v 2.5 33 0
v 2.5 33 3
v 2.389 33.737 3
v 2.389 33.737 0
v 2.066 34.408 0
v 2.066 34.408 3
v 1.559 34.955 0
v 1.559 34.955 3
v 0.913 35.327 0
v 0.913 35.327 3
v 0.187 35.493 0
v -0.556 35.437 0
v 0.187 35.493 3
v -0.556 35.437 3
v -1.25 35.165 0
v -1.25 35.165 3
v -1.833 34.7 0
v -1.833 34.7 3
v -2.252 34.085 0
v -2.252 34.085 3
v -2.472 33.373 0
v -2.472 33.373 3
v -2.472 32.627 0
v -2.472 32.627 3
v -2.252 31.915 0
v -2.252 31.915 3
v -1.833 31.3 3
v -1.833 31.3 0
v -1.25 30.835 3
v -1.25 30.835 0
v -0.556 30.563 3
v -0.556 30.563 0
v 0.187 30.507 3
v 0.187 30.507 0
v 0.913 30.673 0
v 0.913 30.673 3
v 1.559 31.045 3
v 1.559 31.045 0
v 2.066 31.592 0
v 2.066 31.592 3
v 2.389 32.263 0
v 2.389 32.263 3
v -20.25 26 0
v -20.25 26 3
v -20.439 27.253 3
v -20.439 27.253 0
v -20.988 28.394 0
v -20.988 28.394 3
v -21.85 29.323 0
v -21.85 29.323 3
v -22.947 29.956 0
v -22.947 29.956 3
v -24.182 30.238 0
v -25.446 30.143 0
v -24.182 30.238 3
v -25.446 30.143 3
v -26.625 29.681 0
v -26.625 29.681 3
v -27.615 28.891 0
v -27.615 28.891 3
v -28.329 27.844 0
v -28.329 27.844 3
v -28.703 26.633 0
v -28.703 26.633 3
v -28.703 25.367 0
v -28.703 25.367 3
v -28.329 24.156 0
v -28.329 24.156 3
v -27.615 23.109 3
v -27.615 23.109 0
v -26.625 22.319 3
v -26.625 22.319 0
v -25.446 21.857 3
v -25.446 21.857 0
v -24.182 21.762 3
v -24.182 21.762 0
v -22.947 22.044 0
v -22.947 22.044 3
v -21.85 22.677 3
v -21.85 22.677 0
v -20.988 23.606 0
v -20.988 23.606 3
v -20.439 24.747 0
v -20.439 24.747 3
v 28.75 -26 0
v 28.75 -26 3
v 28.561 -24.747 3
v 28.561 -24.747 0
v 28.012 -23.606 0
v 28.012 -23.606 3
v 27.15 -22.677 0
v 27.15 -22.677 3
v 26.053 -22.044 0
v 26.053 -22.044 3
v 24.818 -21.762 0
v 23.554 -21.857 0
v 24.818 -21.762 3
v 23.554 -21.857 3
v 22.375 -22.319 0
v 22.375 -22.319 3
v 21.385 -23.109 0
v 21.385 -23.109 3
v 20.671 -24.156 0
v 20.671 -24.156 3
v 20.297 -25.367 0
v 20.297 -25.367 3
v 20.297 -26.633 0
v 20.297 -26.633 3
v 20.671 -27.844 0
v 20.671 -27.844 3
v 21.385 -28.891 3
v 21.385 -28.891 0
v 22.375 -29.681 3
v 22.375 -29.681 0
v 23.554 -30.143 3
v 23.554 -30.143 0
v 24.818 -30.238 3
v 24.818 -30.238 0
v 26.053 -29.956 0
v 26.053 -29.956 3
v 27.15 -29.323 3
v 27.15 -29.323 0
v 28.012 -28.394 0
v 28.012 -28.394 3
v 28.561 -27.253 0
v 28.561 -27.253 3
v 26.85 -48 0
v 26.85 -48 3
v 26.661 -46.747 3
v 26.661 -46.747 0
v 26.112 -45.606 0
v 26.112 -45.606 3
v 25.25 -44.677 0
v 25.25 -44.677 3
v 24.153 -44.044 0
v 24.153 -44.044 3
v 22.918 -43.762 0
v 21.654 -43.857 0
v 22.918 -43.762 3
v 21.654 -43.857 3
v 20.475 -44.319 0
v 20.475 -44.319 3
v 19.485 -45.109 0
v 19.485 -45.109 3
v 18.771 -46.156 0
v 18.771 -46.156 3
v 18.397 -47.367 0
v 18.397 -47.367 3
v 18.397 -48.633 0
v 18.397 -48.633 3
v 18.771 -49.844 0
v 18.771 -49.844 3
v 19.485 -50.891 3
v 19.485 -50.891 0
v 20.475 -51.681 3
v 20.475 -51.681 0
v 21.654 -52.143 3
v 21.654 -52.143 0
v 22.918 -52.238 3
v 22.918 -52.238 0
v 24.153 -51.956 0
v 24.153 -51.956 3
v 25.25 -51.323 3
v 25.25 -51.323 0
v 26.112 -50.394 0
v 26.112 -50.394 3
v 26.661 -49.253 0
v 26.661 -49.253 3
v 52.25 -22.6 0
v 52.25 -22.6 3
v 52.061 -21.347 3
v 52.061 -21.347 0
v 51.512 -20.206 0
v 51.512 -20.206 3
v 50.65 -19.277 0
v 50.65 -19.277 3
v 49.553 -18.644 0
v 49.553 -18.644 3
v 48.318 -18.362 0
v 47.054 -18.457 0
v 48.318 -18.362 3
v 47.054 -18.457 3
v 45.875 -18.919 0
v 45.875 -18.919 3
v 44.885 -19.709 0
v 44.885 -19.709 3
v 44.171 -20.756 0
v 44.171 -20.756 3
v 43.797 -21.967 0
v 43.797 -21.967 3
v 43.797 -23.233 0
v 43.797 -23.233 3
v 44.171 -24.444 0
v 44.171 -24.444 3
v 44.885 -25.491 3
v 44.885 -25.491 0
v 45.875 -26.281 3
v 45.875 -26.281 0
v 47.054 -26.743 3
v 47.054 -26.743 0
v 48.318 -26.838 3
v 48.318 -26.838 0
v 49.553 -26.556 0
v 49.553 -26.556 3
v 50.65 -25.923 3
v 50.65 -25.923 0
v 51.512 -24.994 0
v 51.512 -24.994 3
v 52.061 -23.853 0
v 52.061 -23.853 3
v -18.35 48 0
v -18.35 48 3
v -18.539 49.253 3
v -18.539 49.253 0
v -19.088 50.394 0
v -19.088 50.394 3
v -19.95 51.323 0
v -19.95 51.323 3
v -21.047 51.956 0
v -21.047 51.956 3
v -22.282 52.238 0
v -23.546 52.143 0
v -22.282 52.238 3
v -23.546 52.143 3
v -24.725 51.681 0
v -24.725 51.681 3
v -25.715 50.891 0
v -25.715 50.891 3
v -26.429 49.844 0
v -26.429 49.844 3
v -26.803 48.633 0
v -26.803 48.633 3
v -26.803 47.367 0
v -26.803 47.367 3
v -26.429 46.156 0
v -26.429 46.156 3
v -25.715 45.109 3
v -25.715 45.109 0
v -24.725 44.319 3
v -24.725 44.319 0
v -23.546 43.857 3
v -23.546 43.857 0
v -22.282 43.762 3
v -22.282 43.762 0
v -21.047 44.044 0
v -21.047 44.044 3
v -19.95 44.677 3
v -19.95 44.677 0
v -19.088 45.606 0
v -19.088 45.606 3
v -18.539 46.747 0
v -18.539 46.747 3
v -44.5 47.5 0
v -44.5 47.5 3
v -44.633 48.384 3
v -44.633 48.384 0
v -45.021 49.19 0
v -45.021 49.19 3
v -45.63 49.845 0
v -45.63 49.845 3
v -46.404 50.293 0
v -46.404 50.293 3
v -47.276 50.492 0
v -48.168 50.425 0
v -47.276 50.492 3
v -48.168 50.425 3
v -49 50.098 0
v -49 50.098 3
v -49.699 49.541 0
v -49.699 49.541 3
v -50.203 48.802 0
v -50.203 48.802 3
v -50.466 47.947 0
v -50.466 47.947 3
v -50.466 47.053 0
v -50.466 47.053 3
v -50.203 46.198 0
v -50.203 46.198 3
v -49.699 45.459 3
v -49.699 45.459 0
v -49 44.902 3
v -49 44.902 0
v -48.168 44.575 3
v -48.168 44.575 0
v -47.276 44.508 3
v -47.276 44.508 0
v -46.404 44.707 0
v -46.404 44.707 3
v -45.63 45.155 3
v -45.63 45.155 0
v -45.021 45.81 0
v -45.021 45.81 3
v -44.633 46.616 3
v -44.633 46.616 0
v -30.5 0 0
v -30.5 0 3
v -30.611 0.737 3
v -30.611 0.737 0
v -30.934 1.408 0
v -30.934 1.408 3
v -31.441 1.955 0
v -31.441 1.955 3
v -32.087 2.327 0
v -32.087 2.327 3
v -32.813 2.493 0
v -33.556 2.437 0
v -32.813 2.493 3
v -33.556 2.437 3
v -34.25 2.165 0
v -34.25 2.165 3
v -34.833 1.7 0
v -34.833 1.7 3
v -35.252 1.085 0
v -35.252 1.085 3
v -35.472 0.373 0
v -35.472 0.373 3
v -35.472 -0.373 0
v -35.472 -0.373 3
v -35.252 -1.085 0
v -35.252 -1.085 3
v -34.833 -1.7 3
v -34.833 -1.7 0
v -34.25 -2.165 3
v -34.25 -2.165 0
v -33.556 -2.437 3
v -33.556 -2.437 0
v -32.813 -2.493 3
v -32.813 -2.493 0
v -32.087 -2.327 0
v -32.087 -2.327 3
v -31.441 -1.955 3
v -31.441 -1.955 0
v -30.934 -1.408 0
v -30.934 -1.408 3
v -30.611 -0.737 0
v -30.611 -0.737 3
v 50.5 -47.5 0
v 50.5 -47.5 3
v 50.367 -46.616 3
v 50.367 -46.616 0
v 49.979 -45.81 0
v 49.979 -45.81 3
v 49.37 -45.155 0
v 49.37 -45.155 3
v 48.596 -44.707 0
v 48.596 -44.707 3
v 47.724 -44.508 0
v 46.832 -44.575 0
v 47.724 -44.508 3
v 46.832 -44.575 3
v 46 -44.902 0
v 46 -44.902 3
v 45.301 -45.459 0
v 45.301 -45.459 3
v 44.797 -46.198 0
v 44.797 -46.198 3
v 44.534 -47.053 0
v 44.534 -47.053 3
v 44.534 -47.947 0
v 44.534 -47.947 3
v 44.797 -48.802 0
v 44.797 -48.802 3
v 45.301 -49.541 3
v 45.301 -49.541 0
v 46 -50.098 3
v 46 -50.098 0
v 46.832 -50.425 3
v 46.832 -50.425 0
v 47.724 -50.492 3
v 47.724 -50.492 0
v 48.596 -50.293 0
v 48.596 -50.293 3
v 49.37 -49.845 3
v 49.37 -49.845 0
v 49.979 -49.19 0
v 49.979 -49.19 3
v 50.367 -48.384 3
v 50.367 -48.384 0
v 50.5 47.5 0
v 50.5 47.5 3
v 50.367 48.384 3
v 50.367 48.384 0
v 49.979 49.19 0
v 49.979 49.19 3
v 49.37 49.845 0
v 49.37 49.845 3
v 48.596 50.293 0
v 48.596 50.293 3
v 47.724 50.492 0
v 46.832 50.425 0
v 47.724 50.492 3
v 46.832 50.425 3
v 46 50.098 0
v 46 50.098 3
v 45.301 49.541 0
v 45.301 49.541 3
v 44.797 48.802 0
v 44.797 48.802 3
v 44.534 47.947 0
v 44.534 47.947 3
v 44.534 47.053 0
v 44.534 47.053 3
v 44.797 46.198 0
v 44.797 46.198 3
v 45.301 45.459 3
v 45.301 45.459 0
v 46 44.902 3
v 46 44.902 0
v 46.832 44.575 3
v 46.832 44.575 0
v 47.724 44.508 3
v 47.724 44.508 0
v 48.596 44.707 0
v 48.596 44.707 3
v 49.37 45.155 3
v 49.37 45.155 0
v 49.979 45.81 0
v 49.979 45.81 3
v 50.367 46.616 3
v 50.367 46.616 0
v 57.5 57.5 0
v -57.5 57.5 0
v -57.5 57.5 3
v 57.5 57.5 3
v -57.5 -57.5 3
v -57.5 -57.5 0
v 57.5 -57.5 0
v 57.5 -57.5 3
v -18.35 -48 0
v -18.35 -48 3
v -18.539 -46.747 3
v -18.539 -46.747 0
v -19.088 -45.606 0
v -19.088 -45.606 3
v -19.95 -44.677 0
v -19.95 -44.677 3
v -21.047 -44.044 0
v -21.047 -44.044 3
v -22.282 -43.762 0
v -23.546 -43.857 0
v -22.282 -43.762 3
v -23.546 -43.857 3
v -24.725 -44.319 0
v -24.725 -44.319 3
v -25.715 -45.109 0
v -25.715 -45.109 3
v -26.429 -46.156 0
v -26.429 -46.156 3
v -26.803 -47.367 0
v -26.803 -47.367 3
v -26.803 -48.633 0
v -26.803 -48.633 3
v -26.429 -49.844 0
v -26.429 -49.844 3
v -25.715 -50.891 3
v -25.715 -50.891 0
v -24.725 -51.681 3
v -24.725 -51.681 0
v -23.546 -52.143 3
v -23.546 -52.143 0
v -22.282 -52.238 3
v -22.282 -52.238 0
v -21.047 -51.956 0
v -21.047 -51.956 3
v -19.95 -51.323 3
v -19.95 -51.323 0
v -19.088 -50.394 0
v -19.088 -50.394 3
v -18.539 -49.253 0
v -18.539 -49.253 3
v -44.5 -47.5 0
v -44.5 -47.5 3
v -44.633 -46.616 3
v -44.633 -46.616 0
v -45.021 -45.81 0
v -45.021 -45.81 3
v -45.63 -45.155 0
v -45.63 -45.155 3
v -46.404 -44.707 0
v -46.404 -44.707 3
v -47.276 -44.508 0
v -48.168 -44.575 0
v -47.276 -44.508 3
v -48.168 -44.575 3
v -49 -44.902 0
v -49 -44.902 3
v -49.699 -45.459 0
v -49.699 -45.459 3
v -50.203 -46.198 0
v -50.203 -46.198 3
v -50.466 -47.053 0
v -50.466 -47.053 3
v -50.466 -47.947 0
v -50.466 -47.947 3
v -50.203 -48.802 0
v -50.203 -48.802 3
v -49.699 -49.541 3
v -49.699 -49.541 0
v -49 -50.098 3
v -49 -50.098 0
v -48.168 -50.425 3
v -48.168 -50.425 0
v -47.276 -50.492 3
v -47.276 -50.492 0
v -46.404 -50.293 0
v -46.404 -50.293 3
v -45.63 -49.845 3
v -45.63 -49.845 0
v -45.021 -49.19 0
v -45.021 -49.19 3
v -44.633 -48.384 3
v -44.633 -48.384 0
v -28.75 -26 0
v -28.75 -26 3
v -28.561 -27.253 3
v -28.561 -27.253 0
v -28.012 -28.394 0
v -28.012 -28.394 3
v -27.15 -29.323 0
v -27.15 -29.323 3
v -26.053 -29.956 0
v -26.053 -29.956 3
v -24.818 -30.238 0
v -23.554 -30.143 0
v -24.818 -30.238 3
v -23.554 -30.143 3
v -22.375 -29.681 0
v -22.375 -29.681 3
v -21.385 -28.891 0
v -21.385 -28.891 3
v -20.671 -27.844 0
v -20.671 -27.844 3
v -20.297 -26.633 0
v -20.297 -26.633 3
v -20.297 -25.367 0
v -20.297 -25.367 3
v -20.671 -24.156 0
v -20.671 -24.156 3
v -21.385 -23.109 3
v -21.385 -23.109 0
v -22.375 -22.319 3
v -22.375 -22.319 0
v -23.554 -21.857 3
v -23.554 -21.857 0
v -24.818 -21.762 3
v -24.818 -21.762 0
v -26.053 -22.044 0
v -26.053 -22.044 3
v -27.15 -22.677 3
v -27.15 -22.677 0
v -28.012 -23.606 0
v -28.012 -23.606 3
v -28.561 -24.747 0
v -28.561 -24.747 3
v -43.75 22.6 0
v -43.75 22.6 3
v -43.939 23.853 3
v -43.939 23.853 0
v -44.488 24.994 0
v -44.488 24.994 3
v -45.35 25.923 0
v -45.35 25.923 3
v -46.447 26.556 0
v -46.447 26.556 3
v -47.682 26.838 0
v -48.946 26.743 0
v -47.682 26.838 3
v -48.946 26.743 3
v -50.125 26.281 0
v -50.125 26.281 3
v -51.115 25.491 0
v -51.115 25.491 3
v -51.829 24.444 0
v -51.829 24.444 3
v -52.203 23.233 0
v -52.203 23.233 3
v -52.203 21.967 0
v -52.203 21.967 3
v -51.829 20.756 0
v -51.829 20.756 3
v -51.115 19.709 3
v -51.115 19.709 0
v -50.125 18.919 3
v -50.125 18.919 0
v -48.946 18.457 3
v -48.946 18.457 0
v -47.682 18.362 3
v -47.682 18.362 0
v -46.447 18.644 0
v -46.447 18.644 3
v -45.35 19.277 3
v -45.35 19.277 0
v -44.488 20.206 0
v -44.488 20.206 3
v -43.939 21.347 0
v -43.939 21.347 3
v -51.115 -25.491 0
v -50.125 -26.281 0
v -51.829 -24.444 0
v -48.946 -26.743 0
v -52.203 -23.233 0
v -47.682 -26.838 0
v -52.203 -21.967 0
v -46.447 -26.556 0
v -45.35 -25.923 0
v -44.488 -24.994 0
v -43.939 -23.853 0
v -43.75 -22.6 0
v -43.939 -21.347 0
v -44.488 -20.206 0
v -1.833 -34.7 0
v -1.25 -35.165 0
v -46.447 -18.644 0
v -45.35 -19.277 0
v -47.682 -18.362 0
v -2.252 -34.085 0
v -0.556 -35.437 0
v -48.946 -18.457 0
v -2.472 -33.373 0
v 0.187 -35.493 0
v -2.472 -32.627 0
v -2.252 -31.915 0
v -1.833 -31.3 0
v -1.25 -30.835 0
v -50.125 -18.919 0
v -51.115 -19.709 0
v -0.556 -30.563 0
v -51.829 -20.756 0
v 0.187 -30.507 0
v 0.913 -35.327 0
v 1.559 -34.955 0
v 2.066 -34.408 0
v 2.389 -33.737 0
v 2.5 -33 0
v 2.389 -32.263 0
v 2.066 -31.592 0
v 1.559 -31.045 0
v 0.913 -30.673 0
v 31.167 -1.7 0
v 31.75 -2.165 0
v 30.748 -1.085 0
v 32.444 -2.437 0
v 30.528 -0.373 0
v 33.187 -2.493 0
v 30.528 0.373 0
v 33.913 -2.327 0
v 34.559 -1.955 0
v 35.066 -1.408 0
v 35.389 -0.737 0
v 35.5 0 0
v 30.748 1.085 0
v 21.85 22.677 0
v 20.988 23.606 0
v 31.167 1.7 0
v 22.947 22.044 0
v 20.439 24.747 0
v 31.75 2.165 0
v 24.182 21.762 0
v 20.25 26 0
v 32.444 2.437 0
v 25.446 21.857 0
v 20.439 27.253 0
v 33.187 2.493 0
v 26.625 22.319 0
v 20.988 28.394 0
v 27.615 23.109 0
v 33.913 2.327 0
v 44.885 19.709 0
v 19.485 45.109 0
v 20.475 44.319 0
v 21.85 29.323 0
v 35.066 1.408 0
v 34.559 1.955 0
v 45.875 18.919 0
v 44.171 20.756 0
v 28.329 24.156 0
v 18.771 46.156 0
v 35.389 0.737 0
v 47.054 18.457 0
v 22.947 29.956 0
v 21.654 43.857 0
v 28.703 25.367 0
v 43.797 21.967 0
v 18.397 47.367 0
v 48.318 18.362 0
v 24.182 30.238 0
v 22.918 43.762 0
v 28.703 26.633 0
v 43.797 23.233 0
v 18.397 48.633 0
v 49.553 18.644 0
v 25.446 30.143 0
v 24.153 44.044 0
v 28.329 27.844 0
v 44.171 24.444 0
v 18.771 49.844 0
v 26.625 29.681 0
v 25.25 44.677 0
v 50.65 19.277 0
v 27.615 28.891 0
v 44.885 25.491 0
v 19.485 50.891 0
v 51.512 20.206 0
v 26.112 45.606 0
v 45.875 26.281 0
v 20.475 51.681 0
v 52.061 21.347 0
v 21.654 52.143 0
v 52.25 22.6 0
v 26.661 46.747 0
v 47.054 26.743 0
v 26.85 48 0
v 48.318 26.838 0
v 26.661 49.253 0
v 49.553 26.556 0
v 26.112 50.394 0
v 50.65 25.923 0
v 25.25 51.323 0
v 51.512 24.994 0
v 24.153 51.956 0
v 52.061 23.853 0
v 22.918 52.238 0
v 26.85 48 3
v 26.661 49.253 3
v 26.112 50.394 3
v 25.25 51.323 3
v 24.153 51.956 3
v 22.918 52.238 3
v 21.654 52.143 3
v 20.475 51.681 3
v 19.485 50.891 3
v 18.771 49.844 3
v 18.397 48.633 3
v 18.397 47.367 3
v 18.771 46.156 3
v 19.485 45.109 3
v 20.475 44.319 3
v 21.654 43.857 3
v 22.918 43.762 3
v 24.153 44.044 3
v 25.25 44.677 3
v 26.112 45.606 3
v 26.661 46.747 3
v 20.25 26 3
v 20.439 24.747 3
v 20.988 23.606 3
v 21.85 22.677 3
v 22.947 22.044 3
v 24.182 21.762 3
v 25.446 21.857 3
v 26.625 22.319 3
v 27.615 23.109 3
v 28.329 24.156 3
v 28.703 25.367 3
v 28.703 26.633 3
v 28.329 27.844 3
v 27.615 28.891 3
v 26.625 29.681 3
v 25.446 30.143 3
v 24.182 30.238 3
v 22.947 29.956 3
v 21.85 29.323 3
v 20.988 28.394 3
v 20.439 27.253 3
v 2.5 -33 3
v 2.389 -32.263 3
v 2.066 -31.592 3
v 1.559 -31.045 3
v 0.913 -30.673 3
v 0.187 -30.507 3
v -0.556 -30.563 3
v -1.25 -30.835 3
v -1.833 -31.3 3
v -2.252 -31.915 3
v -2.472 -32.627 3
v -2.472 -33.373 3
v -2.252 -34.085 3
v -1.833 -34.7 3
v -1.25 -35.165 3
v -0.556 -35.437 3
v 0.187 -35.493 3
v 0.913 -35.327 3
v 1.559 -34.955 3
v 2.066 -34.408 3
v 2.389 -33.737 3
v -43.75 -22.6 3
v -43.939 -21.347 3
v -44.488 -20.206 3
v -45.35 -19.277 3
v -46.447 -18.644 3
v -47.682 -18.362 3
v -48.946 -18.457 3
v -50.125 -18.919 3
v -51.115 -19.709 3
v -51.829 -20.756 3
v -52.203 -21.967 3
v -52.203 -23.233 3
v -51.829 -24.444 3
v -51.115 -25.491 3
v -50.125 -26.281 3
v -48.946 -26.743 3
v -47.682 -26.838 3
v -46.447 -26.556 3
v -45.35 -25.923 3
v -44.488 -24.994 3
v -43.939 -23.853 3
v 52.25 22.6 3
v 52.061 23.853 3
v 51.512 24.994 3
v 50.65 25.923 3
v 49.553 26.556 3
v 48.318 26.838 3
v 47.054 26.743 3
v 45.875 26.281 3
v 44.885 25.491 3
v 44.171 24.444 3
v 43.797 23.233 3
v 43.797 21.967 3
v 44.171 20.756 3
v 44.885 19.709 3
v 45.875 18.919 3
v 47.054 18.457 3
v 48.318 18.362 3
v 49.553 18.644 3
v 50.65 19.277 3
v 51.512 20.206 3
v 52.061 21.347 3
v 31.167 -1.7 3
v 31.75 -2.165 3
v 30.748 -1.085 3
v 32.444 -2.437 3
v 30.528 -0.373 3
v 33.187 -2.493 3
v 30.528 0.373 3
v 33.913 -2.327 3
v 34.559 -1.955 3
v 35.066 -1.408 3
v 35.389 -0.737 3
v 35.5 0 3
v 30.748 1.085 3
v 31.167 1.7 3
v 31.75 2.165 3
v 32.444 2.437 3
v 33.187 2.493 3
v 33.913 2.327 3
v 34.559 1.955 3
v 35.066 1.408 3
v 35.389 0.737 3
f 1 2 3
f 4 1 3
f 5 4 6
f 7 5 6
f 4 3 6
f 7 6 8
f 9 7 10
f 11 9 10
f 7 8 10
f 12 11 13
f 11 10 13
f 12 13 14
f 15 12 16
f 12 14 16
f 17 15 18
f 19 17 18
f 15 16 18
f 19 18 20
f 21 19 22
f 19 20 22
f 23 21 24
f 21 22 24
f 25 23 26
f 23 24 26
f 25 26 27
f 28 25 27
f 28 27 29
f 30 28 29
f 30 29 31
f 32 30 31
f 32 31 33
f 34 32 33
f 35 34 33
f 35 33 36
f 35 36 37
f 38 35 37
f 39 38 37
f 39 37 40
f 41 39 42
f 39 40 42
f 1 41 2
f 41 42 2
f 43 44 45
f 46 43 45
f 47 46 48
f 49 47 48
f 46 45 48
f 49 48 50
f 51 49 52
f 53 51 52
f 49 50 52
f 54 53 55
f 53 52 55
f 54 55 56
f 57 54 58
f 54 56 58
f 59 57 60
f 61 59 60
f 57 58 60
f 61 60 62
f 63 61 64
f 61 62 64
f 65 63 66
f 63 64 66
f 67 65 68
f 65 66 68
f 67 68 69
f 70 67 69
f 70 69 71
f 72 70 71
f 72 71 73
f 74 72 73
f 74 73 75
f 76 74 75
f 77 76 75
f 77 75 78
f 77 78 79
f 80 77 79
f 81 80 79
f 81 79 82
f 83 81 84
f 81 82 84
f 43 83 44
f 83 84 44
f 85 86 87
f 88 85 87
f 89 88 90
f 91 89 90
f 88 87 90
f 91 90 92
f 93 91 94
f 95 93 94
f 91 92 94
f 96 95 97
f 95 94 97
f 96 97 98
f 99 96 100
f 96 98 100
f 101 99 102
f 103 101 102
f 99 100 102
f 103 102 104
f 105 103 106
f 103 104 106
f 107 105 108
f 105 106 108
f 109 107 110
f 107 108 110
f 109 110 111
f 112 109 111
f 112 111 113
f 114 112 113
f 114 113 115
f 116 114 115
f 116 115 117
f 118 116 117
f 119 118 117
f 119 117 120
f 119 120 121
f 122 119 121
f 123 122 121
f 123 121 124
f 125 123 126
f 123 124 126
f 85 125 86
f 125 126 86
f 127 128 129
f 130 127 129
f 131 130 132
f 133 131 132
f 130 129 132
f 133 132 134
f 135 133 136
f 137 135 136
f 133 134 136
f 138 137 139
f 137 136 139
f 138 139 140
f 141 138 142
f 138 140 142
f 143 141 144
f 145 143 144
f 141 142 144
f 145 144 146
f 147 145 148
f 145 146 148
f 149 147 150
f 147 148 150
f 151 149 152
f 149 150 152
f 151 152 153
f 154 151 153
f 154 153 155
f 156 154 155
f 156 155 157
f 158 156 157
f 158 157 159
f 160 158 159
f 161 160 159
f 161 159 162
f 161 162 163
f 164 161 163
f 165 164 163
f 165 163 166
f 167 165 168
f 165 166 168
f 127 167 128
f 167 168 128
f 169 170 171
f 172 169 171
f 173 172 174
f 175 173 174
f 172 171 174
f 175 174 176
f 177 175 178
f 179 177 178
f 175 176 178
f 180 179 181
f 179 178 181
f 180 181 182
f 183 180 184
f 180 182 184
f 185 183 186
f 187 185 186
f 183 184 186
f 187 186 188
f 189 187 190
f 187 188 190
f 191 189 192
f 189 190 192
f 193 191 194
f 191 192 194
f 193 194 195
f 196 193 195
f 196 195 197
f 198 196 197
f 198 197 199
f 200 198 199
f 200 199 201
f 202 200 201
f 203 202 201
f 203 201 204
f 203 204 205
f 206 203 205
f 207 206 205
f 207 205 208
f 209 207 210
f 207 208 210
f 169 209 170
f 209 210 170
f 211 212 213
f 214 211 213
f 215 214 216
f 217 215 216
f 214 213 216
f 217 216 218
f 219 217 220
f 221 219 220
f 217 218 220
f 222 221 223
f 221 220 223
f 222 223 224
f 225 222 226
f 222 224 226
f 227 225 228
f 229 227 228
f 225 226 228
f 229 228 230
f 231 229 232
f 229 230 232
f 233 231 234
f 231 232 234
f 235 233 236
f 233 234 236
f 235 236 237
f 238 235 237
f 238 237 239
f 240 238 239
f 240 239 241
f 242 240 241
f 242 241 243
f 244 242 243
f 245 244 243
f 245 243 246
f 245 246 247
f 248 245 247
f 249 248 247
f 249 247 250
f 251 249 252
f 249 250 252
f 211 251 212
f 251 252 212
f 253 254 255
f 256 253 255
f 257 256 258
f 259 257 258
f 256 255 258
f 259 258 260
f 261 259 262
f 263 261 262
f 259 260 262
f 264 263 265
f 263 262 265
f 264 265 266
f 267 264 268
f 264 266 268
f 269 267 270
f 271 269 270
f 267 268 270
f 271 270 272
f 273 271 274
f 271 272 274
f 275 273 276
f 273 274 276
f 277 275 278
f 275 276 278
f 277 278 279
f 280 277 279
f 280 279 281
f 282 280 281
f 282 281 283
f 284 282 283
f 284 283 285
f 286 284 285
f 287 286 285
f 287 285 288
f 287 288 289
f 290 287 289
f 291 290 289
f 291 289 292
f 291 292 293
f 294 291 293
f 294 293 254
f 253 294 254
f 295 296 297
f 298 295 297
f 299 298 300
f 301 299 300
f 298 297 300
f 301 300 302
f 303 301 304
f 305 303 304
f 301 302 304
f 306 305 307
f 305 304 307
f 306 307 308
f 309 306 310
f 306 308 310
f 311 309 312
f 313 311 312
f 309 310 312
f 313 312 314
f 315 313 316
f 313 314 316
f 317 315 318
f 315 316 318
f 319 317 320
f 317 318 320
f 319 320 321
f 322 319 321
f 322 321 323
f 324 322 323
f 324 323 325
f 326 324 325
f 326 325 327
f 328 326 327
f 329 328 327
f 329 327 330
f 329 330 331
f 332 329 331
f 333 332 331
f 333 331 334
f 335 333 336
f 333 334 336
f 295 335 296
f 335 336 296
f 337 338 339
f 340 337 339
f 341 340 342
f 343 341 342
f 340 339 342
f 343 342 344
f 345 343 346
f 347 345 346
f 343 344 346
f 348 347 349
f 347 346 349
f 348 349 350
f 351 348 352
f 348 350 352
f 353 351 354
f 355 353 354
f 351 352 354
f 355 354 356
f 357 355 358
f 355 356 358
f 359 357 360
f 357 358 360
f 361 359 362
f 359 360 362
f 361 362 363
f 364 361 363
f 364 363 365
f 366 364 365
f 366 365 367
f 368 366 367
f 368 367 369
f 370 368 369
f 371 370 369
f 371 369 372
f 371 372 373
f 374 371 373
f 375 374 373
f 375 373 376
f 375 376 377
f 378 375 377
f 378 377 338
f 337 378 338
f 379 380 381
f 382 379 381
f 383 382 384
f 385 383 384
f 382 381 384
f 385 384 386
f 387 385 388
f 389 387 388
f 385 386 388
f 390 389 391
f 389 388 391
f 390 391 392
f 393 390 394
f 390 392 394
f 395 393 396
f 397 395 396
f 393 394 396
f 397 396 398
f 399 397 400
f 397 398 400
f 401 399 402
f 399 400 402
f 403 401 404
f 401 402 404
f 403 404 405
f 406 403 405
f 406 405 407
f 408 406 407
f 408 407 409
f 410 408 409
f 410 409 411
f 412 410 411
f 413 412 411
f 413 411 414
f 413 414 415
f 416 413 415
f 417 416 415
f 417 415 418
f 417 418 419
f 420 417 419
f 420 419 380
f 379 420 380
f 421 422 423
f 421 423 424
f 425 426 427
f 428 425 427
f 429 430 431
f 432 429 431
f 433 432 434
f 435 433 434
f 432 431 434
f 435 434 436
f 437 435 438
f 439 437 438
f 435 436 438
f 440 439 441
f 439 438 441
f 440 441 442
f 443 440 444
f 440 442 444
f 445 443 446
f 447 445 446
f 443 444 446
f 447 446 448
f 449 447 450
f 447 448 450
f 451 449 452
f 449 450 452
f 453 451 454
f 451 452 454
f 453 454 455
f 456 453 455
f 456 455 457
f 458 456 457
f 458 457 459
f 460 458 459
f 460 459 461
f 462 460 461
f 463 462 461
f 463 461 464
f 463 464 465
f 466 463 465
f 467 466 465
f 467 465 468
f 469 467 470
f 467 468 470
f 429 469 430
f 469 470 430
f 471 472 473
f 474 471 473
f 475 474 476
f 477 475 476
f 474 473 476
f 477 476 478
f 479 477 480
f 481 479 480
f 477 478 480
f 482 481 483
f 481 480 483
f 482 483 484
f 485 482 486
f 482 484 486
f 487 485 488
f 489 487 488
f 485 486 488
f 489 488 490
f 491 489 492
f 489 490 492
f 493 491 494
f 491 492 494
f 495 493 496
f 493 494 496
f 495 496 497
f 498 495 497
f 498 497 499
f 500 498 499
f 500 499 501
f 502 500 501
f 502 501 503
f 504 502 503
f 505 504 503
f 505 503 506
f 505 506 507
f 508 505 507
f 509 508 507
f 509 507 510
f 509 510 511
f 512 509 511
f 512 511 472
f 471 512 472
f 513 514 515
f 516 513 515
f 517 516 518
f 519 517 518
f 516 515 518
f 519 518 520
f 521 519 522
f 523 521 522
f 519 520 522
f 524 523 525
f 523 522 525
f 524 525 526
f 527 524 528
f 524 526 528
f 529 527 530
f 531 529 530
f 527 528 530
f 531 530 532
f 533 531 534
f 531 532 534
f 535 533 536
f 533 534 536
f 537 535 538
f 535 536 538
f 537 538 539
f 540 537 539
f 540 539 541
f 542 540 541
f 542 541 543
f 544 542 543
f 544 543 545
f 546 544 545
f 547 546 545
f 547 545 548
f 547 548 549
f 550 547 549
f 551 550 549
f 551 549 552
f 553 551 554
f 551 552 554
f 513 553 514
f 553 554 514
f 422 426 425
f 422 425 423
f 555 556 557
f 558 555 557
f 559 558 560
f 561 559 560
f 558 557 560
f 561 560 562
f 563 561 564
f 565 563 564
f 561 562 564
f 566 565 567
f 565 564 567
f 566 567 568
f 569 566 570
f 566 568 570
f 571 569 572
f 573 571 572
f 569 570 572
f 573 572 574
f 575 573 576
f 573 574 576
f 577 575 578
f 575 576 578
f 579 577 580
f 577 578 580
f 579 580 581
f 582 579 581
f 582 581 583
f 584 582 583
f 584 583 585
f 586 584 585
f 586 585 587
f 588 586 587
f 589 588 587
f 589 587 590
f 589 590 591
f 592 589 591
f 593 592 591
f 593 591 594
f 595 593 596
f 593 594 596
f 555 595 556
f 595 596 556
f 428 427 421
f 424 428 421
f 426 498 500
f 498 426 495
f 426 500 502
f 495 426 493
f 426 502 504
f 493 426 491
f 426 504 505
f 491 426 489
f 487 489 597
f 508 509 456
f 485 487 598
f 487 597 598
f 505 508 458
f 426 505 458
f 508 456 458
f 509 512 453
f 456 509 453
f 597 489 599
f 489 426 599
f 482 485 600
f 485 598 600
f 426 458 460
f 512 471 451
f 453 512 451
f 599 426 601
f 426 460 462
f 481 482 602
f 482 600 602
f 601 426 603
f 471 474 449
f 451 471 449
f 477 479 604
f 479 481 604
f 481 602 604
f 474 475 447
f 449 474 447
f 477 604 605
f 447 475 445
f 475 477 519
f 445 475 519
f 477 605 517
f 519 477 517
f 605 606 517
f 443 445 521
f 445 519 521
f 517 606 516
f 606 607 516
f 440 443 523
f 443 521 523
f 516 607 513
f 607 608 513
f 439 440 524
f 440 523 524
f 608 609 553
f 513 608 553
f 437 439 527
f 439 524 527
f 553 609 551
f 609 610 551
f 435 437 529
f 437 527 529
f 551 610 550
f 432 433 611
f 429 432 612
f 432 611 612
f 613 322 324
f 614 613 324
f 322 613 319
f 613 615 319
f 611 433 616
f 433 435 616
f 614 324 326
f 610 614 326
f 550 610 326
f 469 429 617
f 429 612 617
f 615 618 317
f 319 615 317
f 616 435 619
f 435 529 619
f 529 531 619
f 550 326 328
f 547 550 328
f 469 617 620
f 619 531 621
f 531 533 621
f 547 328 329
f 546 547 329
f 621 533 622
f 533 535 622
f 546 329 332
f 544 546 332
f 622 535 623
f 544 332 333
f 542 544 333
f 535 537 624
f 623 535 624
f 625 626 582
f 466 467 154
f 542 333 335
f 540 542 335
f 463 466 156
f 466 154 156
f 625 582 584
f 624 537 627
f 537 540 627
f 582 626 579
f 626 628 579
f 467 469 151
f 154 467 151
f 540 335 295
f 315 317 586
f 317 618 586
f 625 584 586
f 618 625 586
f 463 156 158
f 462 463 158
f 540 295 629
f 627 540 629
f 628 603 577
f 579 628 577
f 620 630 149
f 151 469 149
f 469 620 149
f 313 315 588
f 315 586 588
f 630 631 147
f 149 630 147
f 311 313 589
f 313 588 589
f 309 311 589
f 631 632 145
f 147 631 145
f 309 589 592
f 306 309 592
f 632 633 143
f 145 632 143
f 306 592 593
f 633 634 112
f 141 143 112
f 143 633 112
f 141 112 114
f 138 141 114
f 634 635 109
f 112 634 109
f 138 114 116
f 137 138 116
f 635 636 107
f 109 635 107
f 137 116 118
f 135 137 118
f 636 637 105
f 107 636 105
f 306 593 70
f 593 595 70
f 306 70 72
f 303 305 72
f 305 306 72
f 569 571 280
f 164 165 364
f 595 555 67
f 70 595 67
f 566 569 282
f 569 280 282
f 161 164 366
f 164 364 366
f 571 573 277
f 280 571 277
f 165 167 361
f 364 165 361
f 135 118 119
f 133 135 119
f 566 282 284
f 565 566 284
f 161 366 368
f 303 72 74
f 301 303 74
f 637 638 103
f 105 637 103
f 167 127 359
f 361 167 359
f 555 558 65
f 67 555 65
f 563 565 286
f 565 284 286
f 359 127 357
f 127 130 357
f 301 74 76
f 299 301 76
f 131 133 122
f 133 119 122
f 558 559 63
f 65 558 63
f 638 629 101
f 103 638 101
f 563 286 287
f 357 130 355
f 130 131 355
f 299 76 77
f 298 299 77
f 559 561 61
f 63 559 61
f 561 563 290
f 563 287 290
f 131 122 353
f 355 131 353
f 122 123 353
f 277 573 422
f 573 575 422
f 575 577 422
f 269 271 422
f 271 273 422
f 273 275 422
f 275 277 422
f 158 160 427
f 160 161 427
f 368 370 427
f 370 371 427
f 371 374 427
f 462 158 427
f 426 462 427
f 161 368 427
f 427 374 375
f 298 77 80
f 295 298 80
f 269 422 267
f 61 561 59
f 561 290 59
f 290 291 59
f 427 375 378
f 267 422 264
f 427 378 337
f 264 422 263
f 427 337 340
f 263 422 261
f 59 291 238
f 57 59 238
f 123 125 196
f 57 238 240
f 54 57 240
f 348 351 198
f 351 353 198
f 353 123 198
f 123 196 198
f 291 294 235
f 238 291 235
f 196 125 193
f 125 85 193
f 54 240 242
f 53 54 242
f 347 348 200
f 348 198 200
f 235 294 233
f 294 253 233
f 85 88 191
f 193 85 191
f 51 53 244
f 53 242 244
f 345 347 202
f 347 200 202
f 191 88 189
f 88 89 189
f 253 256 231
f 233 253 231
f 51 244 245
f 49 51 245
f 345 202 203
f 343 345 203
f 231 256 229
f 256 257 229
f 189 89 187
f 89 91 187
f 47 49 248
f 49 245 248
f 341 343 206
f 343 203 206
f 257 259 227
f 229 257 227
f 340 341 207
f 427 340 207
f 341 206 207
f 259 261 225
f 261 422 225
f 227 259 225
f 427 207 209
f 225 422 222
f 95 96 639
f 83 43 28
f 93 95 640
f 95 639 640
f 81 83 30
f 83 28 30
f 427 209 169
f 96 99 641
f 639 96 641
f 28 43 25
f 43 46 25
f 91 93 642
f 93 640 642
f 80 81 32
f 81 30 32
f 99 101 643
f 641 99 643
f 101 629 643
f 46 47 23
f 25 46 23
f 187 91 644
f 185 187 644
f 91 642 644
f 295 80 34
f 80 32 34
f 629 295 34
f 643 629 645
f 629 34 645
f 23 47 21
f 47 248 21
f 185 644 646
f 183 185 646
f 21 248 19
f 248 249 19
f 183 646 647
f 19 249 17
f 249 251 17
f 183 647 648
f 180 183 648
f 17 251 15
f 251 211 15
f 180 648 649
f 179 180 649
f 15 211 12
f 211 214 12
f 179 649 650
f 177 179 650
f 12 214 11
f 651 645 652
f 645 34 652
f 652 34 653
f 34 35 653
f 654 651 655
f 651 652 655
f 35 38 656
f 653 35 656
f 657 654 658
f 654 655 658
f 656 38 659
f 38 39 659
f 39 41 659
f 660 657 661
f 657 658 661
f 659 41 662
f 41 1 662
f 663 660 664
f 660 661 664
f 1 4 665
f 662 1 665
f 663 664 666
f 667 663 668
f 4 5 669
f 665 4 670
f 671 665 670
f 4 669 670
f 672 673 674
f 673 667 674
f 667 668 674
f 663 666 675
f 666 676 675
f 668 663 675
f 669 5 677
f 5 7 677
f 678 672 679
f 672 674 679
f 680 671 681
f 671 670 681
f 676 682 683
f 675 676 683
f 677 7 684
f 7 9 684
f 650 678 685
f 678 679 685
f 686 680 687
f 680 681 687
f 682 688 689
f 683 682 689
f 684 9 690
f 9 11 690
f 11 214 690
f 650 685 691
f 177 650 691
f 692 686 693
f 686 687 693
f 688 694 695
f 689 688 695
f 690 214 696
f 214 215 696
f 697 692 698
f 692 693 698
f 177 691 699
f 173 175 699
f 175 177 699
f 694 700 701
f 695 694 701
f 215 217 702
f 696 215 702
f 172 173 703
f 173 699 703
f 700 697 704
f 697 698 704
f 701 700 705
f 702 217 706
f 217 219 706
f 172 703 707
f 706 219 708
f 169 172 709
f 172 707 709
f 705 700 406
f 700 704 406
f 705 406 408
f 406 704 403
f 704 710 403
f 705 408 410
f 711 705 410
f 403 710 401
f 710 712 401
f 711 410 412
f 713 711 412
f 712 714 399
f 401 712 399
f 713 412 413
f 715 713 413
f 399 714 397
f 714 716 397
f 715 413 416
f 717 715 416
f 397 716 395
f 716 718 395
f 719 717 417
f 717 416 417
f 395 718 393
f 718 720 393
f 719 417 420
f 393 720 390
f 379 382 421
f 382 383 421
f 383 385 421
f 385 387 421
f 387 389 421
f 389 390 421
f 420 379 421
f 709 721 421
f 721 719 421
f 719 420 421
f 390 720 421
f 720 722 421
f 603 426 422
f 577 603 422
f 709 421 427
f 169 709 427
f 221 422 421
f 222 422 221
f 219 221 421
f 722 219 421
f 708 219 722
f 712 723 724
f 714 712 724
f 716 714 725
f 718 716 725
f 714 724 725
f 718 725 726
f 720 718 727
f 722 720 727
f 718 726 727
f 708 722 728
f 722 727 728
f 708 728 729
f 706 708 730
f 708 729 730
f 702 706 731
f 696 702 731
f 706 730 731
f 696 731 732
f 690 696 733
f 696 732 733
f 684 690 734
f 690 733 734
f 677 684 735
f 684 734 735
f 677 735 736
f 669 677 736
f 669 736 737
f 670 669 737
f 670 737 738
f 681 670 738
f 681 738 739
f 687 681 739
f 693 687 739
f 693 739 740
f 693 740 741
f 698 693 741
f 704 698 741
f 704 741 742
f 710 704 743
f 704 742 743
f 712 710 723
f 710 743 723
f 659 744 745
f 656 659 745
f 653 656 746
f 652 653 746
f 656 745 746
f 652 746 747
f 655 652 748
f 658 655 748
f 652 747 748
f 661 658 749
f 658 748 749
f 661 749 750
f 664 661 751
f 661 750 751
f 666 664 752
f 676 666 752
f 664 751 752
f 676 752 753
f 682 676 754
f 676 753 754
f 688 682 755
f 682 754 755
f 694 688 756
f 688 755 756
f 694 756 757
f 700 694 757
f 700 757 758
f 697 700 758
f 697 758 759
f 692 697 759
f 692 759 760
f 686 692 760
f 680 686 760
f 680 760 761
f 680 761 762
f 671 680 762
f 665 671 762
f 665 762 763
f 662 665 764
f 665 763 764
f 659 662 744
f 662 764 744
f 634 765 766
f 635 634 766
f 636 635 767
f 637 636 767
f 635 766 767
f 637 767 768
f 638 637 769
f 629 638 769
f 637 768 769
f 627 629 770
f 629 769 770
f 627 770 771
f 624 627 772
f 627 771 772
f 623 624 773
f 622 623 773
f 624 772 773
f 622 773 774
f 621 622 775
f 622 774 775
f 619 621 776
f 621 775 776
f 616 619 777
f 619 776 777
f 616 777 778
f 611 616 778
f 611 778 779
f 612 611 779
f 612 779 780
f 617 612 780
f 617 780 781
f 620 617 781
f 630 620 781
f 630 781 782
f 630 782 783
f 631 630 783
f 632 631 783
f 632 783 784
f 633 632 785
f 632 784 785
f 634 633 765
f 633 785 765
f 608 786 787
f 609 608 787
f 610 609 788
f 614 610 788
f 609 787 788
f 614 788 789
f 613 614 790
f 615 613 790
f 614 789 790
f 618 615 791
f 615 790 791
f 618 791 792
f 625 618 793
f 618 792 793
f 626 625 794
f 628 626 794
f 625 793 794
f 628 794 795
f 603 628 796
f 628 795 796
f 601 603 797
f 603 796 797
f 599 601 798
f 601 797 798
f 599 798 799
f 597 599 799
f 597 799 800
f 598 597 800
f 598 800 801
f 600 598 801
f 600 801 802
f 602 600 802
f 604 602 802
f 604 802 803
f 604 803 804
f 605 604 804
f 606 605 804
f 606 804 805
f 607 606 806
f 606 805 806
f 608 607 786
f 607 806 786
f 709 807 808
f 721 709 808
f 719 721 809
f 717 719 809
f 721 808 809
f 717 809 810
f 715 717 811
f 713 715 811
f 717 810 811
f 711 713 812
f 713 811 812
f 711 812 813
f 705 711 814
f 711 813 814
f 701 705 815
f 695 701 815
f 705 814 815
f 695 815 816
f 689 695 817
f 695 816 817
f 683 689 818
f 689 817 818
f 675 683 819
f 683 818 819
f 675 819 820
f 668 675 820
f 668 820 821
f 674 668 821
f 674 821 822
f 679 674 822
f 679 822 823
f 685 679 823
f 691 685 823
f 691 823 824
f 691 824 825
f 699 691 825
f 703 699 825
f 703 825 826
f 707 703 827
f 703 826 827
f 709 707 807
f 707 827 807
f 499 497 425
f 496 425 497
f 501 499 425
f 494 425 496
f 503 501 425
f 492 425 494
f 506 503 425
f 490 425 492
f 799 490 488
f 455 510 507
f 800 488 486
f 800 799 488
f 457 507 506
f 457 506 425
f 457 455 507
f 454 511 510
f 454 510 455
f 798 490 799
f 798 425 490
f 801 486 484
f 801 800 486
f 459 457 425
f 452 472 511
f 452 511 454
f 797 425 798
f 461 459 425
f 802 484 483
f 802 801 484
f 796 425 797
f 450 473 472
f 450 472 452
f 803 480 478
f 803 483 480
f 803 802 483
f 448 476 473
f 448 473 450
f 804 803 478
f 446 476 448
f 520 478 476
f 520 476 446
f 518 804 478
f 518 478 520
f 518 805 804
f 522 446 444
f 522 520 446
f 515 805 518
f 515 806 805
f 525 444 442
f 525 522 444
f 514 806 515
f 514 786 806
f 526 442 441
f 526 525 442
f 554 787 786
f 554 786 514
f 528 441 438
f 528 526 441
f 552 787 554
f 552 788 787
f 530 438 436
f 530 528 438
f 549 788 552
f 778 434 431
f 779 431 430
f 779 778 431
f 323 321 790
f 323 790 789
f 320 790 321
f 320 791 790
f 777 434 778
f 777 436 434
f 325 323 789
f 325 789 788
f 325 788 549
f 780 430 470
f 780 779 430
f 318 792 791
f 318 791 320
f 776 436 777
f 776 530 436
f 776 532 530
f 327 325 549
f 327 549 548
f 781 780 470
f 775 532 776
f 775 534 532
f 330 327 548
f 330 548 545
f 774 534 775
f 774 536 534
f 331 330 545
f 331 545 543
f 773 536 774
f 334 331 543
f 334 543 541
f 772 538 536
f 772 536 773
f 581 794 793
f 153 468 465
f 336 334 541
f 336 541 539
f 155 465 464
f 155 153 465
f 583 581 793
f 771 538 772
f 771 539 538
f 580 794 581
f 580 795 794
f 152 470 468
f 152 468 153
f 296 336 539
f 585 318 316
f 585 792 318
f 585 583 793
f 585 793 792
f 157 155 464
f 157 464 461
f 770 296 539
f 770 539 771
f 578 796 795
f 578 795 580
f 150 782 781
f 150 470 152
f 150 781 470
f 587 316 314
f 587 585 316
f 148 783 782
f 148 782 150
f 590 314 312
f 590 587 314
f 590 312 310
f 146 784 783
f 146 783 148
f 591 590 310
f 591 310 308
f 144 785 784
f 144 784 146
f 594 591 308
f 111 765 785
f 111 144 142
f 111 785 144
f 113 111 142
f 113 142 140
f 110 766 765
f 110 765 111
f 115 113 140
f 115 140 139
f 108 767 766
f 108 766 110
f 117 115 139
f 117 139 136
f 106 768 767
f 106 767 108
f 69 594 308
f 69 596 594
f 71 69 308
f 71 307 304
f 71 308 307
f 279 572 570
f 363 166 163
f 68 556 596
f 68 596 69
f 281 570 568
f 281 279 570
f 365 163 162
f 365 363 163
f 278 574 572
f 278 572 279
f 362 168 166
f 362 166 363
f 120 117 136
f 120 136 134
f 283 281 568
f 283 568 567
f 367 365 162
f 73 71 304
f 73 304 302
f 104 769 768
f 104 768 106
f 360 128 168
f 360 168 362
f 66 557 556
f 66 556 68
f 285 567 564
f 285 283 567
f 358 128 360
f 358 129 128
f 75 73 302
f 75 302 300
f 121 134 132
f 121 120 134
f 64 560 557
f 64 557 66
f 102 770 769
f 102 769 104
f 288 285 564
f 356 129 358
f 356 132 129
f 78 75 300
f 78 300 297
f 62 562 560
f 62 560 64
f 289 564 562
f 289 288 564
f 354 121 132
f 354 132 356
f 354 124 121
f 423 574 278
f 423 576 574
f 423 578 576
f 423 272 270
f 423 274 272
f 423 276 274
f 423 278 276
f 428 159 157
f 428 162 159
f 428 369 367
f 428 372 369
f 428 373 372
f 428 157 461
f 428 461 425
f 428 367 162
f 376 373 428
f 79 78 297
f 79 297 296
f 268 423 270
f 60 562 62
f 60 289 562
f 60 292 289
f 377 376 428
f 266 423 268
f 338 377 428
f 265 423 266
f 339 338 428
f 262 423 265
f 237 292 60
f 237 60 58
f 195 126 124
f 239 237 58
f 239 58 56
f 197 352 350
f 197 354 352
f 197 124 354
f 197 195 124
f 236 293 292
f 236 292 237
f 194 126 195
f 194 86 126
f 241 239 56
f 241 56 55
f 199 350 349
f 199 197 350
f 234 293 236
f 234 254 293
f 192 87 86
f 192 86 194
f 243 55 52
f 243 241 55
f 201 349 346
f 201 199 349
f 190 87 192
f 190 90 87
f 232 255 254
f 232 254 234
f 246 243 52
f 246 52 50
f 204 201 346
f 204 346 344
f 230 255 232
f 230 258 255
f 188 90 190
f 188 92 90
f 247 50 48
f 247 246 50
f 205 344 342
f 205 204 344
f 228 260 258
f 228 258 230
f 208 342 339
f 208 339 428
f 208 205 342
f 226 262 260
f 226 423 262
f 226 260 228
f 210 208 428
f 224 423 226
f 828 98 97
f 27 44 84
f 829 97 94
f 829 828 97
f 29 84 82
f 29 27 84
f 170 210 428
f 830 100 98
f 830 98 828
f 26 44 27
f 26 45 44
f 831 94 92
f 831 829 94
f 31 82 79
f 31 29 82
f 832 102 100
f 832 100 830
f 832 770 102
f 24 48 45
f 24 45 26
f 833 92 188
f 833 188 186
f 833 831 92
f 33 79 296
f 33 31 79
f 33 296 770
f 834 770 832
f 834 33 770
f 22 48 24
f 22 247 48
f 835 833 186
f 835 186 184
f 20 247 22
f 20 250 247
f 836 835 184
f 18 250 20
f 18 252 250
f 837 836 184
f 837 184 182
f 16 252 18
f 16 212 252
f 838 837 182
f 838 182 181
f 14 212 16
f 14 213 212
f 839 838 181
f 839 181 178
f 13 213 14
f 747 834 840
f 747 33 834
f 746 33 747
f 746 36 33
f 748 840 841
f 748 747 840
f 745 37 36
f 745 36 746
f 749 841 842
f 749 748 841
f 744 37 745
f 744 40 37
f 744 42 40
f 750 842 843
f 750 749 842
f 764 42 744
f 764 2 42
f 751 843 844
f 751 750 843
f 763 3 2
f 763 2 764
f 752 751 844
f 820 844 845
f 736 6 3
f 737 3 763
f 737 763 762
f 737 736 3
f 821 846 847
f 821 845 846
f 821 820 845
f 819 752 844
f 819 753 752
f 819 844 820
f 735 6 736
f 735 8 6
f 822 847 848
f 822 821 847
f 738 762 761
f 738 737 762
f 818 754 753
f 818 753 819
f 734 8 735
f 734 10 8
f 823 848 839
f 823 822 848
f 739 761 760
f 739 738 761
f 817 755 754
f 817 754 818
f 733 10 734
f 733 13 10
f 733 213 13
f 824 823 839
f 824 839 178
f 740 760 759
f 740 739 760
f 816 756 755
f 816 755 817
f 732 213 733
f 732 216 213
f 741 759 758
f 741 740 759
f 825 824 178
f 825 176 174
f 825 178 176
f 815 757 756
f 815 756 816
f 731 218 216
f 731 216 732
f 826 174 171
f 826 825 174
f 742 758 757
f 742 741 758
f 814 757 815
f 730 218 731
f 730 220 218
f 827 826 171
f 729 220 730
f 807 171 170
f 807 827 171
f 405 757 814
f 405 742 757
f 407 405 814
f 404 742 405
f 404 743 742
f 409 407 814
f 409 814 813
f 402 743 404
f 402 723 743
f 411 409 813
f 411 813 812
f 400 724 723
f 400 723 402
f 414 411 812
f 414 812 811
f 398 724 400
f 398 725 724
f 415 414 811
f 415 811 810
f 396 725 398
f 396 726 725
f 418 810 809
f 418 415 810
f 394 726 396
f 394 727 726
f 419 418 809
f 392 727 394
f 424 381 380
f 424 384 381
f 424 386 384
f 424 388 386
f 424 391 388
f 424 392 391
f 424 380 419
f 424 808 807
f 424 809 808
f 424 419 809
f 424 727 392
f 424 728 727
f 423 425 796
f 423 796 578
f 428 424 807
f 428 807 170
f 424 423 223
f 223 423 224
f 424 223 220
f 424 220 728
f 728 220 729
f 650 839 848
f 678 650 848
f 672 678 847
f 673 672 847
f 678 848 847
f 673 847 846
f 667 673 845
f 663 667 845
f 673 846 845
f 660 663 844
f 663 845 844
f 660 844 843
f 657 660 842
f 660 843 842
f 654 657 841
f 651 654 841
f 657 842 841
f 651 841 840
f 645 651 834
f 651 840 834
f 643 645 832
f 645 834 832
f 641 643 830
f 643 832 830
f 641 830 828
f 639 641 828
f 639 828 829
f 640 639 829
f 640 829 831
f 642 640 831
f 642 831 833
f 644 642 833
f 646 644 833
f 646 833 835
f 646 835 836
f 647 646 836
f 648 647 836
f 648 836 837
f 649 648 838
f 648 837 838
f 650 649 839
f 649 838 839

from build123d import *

# Parameters (mm, degrees)
SKETCH_1_W          = 115
SKETCH_1_H          = 115
EXTRUDE_1_DEPTH     = 3
SKETCH_3_R          = 3
CUT_EXTRUDE_2_DEPTH = 82.372599811
SKETCH_4_R          = 4.25
SKETCH_4_R_2        = 2.5
CUT_EXTRUDE_3_DEPTH = 3
SKETCH_5_R          = 4.25
CUT_EXTRUDE_4_DEPTH = 3


with BuildPart() as part:
    # 草图1 → 凸台-拉伸1 (new body)
    with BuildSketch(Plane.XY):
        Rectangle(SKETCH_1_W, SKETCH_1_H)
    extrude(amount=EXTRUDE_1_DEPTH)

    # 草图3 → 切除-拉伸2 (cut, through all)
    with BuildSketch(Plane.XY.offset(3)):
        with Locations((-47.5, 47.5)):
            Circle(SKETCH_3_R)
        with Locations((47.5, 47.5)):
            Circle(SKETCH_3_R)
        with Locations((47.5, -47.5)):
            Circle(SKETCH_3_R)
        with Locations((-47.5, -47.5)):
            Circle(SKETCH_3_R)
    extrude(amount=-CUT_EXTRUDE_2_DEPTH, mode=Mode.SUBTRACT)

    # 草图4 → 切除-拉伸3 (cut)
    with BuildSketch(Plane.XY.offset(3)):
        with Locations((-22.6, -48)):
            Circle(SKETCH_4_R)
        with Locations((22.6, -48)):
            Circle(SKETCH_4_R)
        with Locations((-48, -22.6)):
            Circle(SKETCH_4_R)
        with Locations((-48, 22.6)):
            Circle(SKETCH_4_R)
        with Locations((48, -22.6)):
            Circle(SKETCH_4_R)
        with Locations((48, 22.6)):
            Circle(SKETCH_4_R)
        with Locations((22.6, 48)):
            Circle(SKETCH_4_R)
        with Locations((-22.6, 48)):
            Circle(SKETCH_4_R)
        with Locations((-33, 0)):
            Circle(SKETCH_4_R_2)
        with Locations((0, -33)):
            Circle(SKETCH_4_R_2)
        with Locations((0, 33)):
            Circle(SKETCH_4_R_2)
        with Locations((33, 0)):
            Circle(SKETCH_4_R_2)
    extrude(amount=-CUT_EXTRUDE_3_DEPTH, mode=Mode.SUBTRACT)

    # 草图5 → 切除-拉伸4 (cut)
    with BuildSketch(Plane.XY.offset(3)):
        with Locations((-24.5, 26)):
            Circle(SKETCH_5_R)
        with Locations(Location((-24.5, -26, 0), (0, 0, 180))):
            Circle(SKETCH_5_R)
        with Locations(Location((24.5, 26, 0), (0, 0, 180))):
            Circle(SKETCH_5_R)
        with Locations((24.5, -26)):
            Circle(SKETCH_5_R)
    extrude(amount=-CUT_EXTRUDE_4_DEPTH, mode=Mode.SUBTRACT)


solid = part.part
